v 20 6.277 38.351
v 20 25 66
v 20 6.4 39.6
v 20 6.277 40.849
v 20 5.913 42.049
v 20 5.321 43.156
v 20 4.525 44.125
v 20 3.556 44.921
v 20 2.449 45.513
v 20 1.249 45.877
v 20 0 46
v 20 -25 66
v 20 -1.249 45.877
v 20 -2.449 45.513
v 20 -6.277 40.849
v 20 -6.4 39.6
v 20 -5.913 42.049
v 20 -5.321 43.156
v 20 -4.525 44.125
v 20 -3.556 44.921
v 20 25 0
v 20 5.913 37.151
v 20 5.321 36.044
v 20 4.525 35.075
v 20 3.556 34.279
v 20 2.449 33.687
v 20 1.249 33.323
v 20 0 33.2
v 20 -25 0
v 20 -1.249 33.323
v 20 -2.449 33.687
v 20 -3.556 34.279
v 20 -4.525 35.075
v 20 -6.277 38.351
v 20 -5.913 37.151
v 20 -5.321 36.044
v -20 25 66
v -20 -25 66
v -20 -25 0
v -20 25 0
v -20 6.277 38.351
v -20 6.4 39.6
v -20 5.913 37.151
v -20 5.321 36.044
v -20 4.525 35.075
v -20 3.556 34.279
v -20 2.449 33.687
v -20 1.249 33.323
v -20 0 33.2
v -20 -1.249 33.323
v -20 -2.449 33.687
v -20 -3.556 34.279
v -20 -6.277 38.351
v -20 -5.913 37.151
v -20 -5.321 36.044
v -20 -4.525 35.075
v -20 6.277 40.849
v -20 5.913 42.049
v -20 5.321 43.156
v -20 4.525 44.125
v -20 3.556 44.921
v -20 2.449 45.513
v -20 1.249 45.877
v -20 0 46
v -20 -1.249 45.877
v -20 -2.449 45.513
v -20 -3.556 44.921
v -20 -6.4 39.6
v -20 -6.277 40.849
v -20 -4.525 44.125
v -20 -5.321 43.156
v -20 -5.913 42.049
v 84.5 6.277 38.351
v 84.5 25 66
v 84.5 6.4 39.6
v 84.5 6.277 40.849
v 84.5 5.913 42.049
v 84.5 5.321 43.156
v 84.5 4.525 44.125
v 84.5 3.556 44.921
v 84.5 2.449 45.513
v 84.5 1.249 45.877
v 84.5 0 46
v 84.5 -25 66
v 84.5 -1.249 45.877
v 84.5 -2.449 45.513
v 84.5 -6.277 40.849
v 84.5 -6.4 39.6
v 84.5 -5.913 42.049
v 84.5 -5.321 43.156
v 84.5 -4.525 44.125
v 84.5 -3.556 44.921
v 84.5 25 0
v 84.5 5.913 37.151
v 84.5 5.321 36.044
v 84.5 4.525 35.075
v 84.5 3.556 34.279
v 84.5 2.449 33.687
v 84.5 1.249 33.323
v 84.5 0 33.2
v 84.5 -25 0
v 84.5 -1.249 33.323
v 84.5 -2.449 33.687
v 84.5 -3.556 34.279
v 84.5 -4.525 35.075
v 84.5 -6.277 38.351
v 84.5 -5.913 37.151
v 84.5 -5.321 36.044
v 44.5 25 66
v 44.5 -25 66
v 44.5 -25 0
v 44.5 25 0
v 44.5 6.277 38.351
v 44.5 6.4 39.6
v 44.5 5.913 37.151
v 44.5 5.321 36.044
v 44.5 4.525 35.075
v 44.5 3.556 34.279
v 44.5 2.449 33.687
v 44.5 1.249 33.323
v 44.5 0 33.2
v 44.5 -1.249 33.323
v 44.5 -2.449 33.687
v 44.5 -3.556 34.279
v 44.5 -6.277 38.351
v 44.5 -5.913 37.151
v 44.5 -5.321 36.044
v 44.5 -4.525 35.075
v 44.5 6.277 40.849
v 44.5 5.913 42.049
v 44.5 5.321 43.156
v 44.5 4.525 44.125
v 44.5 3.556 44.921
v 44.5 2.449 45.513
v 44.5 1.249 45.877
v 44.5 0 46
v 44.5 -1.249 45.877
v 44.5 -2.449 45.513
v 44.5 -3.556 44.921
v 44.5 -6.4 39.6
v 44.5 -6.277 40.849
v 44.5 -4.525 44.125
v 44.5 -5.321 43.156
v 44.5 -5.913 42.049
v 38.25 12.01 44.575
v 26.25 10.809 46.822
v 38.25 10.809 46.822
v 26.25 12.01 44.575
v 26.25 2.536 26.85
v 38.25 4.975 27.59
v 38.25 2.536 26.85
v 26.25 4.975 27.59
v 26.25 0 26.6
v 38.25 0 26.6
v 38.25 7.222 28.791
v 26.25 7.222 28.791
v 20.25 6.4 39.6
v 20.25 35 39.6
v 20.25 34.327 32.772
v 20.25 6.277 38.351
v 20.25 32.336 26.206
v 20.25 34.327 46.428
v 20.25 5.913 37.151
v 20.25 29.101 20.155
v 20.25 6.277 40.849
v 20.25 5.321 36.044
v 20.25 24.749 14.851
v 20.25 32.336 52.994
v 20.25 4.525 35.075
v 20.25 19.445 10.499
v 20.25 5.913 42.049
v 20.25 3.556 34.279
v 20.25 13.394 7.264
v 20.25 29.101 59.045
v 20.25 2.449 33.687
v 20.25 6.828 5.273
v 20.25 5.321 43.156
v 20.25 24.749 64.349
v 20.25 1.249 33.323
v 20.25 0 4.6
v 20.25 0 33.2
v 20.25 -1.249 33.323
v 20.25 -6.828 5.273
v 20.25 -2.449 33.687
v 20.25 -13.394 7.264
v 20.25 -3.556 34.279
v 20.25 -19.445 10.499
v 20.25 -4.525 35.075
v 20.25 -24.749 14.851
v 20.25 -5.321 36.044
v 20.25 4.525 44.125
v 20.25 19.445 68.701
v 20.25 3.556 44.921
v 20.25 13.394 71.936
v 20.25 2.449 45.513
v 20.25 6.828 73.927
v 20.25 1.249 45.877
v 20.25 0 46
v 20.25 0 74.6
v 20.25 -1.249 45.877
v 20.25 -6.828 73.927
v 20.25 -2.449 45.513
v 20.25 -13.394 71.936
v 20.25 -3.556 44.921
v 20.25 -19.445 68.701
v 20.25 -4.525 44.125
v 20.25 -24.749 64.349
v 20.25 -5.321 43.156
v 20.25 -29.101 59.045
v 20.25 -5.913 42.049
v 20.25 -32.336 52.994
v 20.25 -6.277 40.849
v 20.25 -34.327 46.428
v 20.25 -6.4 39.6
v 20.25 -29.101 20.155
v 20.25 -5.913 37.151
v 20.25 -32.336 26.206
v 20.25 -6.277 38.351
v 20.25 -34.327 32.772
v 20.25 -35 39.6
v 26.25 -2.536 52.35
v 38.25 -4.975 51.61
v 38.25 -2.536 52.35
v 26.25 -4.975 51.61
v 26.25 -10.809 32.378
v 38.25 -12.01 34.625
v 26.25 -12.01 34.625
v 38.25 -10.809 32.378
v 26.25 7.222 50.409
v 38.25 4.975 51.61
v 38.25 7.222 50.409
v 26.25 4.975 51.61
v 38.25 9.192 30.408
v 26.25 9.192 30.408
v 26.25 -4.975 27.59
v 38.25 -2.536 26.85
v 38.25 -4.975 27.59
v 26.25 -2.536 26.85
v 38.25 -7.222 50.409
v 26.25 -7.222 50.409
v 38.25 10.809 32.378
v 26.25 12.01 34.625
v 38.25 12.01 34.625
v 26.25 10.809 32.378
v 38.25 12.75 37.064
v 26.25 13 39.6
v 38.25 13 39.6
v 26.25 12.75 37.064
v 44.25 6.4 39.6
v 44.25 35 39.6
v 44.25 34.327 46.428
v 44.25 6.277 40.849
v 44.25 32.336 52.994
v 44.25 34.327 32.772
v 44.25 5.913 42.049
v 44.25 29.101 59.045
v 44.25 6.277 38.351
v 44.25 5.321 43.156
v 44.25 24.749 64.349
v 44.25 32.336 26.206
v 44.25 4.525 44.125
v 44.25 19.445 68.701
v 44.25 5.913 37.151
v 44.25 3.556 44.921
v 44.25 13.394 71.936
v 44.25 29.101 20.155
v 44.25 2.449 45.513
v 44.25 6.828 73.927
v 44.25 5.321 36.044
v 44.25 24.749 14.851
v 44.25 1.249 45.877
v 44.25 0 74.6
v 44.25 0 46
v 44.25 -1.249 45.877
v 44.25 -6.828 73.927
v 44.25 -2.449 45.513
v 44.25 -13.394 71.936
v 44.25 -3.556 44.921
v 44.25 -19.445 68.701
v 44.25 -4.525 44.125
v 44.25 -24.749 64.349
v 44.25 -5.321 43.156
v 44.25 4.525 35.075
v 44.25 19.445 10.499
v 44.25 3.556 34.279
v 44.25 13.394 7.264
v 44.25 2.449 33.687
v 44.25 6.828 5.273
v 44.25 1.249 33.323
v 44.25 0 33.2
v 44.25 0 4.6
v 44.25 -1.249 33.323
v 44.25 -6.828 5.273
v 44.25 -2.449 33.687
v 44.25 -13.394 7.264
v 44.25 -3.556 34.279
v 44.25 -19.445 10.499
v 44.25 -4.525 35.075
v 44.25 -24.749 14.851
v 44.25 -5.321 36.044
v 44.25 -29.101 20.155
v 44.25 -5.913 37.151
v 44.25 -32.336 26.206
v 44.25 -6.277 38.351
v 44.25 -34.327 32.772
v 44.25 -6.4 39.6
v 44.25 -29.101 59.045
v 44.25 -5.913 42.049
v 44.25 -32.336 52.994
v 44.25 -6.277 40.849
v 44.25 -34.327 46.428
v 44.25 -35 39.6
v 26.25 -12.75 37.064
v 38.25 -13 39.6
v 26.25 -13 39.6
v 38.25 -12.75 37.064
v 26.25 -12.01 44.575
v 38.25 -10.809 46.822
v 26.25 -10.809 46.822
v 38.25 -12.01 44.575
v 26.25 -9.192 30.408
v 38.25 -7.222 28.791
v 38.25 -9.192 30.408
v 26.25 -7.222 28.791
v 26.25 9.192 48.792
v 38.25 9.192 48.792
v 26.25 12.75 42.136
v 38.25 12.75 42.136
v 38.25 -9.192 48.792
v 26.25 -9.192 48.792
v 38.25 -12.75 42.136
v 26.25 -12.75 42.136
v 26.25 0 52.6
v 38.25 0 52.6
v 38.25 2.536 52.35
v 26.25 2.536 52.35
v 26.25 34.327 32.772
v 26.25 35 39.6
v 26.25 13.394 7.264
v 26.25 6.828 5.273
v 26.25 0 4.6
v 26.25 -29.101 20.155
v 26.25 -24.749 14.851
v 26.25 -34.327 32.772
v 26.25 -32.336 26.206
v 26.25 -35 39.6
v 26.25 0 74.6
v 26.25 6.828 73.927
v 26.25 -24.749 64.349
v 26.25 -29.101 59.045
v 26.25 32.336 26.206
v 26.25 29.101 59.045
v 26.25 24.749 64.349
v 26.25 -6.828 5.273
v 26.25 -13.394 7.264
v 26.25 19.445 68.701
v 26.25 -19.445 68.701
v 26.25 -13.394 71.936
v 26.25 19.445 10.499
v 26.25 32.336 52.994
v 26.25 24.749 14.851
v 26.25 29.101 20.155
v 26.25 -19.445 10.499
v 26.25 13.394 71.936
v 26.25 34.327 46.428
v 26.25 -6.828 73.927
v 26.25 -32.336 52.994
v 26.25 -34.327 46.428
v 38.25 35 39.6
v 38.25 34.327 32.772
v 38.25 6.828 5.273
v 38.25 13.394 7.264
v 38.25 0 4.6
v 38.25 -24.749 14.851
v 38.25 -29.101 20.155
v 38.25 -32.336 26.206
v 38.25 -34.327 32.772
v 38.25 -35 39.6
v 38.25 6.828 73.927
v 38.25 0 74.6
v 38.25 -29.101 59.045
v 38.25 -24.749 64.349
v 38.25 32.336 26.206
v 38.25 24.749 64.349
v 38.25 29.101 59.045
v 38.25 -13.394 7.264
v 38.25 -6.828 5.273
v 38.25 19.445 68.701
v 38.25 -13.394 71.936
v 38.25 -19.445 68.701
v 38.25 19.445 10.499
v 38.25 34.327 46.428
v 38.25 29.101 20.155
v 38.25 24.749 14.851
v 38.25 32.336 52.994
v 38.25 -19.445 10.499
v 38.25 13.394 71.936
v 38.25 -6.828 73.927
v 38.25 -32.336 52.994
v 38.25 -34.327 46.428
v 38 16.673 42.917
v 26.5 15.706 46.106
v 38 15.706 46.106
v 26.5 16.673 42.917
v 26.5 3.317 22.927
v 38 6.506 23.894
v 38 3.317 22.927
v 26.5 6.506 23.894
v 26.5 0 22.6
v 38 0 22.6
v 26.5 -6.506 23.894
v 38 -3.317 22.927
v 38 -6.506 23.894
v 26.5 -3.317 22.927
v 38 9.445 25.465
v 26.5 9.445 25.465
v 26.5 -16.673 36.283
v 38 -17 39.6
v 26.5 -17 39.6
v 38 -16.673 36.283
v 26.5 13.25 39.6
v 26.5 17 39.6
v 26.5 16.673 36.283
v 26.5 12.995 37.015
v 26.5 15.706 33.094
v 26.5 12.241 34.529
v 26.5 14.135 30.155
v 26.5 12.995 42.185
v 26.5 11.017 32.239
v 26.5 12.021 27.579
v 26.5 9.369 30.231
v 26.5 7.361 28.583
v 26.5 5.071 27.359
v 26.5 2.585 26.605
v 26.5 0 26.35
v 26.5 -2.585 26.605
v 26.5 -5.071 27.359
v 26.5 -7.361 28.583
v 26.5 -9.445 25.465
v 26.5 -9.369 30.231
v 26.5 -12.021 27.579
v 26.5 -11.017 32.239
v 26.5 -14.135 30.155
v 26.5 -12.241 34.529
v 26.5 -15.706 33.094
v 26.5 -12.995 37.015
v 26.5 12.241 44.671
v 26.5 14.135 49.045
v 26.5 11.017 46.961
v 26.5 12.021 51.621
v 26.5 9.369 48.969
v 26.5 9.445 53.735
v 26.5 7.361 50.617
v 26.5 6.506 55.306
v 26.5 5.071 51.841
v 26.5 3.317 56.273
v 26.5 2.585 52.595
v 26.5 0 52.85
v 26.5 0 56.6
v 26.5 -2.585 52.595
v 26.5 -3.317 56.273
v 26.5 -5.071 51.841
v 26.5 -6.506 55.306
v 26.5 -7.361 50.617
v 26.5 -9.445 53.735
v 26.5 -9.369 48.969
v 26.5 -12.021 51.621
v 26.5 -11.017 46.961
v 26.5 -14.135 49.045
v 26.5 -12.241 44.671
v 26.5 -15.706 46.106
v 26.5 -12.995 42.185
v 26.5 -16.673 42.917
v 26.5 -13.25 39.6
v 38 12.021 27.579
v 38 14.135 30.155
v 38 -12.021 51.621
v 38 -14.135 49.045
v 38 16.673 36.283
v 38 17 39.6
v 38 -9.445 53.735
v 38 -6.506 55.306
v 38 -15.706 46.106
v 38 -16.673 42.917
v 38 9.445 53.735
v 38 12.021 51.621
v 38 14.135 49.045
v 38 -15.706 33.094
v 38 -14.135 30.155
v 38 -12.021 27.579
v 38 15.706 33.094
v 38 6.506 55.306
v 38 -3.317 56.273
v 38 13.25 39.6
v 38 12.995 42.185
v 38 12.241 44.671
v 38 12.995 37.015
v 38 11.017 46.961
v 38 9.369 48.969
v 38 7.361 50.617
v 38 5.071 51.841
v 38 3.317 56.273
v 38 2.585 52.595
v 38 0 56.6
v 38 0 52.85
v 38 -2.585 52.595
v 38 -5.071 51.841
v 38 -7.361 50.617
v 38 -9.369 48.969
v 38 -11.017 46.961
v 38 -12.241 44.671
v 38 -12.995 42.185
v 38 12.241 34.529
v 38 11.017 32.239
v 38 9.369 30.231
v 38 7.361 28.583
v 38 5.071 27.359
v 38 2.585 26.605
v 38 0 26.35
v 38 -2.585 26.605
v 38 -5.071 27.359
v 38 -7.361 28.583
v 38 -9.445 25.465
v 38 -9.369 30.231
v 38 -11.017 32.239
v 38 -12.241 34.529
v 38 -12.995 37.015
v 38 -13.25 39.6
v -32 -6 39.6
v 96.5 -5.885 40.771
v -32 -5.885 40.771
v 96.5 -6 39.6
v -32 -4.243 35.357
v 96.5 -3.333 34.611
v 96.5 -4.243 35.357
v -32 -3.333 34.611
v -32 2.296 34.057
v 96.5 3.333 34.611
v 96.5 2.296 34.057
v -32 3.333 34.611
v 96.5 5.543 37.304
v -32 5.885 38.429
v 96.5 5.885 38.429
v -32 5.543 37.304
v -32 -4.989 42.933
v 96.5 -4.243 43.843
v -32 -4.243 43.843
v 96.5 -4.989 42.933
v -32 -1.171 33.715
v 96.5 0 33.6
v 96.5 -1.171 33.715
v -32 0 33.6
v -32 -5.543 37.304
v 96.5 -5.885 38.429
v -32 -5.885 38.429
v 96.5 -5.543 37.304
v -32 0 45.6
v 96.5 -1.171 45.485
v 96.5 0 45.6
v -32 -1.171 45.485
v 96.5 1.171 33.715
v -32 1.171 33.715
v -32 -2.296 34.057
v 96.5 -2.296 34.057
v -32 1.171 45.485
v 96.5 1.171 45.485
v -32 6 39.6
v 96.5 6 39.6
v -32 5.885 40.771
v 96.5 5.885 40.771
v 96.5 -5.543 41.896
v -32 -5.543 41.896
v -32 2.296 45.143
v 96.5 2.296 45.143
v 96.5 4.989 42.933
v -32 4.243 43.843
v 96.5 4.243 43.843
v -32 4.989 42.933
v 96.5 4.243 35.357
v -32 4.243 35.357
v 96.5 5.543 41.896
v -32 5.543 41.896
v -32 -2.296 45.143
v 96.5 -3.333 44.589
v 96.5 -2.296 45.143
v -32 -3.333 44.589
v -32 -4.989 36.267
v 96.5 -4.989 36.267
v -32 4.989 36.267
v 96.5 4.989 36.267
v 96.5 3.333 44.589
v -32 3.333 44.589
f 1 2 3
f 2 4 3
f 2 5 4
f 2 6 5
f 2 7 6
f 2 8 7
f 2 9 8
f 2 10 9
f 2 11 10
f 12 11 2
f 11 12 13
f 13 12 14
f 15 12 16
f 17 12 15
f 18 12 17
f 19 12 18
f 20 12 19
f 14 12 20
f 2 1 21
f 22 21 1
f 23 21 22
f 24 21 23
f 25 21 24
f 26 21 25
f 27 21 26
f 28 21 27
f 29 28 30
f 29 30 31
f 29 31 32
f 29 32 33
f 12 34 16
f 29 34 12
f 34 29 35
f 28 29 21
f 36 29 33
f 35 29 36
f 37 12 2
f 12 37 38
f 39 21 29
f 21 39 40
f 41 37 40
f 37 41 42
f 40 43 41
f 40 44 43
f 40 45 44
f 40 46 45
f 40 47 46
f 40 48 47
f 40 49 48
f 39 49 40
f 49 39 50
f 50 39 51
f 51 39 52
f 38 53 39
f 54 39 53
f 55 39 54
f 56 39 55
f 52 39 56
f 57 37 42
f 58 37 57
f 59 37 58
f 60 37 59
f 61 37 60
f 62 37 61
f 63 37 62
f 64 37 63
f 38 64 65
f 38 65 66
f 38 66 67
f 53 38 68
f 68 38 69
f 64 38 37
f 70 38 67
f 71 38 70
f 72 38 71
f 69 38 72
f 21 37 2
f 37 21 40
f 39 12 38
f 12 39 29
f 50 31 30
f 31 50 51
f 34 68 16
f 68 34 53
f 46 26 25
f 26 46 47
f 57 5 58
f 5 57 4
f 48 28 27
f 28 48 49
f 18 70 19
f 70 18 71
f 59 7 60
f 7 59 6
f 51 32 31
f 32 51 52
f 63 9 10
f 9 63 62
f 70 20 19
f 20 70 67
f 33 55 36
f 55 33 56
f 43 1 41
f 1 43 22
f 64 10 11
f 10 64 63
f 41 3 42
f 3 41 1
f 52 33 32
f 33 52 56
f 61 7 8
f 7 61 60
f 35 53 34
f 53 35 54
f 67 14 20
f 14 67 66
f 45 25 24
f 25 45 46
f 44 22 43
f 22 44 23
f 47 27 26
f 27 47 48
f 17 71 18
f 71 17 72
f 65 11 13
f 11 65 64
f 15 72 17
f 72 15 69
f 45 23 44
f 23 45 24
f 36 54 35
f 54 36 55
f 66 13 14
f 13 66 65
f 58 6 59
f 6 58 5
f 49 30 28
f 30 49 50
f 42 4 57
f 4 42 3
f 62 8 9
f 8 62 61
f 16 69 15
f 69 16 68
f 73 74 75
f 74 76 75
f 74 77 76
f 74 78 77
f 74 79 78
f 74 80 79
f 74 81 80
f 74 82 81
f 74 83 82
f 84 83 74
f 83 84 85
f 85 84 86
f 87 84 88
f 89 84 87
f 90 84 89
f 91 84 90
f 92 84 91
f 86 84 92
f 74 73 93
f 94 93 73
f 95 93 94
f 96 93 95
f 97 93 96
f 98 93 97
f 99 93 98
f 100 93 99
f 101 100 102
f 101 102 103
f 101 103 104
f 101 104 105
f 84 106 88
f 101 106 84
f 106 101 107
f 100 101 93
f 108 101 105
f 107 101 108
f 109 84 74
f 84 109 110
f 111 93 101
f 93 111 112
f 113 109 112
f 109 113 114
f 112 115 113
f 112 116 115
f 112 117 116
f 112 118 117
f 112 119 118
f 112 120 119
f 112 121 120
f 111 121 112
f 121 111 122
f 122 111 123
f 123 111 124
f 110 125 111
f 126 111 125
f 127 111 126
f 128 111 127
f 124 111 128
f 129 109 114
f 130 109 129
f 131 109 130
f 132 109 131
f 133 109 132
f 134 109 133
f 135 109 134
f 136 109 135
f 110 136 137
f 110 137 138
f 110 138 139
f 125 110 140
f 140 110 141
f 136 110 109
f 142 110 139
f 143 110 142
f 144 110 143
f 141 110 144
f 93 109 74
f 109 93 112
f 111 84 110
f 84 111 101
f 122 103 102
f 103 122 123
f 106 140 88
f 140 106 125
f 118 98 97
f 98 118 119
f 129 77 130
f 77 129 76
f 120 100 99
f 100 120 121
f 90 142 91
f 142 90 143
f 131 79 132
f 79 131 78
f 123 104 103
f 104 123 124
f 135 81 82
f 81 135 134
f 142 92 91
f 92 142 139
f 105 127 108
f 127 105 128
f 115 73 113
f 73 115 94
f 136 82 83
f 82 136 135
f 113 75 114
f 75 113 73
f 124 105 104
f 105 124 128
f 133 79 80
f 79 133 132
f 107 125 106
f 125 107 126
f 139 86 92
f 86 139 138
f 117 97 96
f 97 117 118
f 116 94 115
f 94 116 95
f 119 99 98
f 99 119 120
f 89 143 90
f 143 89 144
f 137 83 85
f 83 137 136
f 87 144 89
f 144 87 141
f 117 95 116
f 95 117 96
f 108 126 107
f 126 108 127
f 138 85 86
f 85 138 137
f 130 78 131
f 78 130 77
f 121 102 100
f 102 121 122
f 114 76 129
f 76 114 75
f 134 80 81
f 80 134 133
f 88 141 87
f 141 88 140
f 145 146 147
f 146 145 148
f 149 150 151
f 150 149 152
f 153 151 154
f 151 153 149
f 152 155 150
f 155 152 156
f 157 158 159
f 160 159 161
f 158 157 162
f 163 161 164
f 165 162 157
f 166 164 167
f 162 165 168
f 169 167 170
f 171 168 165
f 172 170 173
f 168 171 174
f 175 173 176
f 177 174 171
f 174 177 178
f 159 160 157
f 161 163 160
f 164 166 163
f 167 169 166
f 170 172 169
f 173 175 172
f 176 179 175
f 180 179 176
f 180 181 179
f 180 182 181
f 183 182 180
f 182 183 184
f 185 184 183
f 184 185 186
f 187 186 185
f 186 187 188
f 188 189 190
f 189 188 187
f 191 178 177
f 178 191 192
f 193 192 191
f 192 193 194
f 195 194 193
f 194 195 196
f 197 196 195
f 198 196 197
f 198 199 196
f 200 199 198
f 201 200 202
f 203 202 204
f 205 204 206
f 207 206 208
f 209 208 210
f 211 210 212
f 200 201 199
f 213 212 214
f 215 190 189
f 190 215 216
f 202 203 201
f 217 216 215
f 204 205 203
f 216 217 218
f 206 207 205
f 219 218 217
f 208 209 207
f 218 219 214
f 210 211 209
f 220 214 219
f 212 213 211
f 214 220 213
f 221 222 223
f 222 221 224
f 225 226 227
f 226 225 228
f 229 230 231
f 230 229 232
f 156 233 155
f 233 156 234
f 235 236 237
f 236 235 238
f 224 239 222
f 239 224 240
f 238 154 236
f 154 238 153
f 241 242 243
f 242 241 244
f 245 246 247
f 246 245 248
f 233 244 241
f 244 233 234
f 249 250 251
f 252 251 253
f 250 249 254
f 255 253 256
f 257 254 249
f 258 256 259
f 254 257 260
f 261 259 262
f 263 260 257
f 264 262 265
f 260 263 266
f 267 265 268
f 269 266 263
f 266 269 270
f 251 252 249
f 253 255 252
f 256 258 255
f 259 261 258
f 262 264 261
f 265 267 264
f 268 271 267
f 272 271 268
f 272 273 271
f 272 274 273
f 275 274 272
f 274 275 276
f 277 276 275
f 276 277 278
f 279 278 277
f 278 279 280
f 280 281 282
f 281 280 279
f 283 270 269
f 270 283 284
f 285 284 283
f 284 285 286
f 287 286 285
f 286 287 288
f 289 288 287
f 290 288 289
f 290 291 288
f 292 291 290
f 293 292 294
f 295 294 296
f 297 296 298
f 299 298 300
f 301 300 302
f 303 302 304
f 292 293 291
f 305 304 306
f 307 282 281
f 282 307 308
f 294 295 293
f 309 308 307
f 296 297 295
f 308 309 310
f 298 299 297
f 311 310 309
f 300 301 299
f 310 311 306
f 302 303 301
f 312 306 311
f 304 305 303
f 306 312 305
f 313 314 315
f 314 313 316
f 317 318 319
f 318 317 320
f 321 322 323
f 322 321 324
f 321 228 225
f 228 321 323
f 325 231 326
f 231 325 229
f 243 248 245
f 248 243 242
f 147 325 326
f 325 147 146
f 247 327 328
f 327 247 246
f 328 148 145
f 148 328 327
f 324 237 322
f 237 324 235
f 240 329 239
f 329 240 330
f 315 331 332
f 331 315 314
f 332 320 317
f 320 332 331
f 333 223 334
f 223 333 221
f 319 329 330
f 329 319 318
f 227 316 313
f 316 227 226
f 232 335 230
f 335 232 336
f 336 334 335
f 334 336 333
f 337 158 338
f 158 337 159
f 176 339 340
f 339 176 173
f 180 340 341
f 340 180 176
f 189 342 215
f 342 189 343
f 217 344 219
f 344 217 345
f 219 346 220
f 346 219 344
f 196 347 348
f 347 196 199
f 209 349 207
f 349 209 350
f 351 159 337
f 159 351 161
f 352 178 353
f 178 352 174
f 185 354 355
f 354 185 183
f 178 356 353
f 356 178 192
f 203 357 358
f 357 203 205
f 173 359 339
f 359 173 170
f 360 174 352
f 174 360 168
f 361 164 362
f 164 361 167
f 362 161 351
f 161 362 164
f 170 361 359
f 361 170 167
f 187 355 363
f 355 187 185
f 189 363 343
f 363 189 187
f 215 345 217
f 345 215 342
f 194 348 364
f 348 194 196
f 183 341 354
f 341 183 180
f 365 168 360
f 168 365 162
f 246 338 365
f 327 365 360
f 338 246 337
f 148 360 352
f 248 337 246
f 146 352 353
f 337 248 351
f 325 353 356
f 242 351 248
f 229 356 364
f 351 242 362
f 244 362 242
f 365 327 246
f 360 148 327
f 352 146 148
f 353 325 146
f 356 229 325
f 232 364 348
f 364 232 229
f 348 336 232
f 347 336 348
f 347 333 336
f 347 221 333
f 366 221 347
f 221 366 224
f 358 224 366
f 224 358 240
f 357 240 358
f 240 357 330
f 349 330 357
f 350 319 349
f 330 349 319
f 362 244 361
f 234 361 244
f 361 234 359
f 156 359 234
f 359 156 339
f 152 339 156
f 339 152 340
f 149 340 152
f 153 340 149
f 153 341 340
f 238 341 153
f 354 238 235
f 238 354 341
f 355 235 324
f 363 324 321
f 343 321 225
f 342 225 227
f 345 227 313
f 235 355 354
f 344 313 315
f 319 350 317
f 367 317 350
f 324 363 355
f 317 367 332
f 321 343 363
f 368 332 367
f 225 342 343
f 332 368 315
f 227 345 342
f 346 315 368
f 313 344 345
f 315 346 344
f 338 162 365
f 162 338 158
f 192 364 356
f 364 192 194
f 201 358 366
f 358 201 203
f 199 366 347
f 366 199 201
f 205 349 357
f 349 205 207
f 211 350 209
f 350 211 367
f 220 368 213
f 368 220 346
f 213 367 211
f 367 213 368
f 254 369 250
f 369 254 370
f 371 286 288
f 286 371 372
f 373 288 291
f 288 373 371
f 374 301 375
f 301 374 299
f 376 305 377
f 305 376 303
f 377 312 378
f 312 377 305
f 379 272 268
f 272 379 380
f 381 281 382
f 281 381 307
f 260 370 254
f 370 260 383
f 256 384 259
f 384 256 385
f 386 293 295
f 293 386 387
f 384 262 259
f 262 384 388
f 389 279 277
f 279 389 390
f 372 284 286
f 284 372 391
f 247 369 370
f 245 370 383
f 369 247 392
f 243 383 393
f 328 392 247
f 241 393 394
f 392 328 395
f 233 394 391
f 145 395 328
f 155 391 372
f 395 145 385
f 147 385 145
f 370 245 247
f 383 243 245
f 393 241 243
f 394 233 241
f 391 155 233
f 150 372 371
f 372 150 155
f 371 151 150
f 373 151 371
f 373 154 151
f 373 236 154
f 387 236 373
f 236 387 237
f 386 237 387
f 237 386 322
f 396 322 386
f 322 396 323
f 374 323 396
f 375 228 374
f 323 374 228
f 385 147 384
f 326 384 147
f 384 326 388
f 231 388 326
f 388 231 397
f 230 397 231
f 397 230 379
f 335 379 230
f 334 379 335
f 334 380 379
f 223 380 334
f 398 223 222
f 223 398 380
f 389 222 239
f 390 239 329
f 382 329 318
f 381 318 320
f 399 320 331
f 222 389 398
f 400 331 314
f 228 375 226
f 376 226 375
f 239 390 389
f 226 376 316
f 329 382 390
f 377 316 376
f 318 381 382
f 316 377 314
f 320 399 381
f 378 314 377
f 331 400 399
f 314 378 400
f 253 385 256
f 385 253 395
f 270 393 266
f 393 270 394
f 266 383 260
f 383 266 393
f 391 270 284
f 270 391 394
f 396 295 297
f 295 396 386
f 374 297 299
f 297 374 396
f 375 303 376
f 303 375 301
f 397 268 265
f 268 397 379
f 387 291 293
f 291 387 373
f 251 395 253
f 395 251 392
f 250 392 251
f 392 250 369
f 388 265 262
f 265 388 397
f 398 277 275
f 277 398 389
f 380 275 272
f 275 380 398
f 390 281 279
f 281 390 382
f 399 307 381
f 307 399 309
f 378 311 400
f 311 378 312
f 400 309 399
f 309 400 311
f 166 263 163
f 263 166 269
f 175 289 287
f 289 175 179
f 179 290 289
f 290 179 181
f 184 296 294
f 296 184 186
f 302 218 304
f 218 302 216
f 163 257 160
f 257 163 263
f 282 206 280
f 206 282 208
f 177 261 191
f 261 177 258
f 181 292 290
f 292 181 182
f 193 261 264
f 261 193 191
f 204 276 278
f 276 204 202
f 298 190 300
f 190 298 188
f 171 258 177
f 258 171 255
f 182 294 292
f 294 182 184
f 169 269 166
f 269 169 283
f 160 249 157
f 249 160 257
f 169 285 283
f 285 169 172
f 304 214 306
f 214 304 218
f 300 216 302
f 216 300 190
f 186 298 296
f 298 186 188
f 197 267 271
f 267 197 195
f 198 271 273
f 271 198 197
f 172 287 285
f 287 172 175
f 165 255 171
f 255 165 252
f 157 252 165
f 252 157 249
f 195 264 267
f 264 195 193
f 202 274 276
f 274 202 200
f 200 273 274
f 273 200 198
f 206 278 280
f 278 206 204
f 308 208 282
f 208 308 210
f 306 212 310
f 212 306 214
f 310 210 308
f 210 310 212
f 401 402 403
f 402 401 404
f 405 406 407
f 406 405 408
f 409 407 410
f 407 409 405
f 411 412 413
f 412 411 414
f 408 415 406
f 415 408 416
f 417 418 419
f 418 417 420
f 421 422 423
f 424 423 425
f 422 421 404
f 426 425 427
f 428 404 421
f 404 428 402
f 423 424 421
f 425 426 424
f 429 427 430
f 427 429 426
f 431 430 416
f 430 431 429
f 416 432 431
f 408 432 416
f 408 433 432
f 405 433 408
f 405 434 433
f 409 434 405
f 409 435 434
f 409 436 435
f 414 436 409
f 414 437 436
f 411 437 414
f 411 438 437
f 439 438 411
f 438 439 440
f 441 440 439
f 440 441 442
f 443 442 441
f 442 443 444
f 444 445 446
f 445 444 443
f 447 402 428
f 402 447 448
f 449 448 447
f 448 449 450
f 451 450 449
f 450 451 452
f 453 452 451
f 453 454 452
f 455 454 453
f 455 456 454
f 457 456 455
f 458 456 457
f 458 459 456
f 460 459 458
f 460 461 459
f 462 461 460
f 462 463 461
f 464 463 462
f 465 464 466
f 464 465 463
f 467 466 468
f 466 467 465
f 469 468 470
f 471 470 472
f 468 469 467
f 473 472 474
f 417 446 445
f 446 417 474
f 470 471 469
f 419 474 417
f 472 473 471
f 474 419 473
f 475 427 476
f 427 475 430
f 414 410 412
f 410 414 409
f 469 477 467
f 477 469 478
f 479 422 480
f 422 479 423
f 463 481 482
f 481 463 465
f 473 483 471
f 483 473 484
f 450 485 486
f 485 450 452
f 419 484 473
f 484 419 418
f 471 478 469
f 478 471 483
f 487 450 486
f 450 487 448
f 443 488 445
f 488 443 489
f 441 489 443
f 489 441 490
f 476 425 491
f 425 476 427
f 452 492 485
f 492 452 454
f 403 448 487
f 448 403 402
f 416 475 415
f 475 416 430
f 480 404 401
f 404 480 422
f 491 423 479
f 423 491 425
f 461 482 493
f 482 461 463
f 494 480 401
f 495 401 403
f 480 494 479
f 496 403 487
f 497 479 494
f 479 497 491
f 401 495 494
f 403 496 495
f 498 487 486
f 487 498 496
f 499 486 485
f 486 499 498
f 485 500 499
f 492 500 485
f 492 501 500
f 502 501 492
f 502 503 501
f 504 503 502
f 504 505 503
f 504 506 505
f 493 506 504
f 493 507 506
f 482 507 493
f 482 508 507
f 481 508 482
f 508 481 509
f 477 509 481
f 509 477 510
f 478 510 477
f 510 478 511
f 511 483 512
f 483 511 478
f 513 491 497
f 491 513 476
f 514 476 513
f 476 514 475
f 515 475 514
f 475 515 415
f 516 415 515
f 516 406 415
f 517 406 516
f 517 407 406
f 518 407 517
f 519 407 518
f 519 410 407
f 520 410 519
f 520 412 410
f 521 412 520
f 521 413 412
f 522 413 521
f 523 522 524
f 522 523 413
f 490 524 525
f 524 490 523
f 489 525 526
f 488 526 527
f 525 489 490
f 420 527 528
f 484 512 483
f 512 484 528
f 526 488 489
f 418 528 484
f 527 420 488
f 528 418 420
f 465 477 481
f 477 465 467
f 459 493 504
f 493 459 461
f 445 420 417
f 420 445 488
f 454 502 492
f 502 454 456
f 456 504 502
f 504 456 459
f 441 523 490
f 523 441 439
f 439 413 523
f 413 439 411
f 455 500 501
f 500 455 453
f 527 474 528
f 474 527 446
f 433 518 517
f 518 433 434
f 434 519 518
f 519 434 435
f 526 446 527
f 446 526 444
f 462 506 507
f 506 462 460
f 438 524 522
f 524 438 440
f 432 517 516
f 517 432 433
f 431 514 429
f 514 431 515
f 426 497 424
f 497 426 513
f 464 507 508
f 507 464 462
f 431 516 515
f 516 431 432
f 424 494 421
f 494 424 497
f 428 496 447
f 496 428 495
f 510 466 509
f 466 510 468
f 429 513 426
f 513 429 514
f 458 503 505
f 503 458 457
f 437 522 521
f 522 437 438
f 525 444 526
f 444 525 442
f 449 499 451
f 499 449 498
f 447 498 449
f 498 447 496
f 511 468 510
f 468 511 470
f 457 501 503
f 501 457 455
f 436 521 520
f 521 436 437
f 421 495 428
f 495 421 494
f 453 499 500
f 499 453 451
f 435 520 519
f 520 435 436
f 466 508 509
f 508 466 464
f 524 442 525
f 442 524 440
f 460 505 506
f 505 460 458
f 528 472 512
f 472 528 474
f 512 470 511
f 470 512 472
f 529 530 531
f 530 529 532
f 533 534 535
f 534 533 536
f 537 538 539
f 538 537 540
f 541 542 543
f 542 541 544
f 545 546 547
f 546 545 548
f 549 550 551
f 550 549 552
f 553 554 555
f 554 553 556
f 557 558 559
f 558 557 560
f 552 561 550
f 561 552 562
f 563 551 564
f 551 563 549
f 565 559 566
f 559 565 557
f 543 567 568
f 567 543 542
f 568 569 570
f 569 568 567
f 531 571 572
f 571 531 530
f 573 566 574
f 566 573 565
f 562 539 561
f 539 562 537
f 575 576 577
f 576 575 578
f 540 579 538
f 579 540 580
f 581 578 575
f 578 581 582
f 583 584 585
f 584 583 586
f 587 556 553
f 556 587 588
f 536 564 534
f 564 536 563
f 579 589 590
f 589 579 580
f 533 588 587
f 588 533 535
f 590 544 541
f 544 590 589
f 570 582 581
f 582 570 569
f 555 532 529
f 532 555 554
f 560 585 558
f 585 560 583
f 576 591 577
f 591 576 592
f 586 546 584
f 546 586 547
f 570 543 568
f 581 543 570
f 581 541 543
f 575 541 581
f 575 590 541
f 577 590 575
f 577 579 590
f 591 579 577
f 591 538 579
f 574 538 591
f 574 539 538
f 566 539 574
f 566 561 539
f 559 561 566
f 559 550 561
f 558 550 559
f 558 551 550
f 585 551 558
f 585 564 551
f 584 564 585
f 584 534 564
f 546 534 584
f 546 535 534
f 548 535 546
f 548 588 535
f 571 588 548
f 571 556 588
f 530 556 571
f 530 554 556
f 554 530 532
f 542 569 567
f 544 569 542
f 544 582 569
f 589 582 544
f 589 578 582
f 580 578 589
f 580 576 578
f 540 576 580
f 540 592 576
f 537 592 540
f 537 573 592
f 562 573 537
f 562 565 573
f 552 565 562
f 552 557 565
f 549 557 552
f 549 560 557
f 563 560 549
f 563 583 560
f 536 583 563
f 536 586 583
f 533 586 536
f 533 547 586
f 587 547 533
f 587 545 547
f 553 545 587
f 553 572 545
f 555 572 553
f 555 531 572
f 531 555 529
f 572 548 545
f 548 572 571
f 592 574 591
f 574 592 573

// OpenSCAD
$fn = 32;

// ------------------------------------------------------------------------
// Pulley assembly: d70 pulley with a belt, shaft d12
// Every part is its own module, assembly() places them once.
// ------------------------------------------------------------------------

// --- part 1 ---
module support1() {
  difference() {
    translate([-20, -25, 0]) cube([40, 50, 66]);
    translate([0, 0, 39.6]) rotate([0, 90, 0]) cylinder(h = 42, d = 12.8, center = true);
  }
}

// --- part 2 ---
module support2() {
  difference() {
    translate([-20, -25, 0]) cube([40, 50, 66]);
    translate([0, 0, 39.6]) rotate([0, 90, 0]) cylinder(h = 42, d = 12.8, center = true);
  }
}

// --- part 3 ---
module shaft() {
  translate([0, 0, -64.25]) cylinder(h = 128.5, d = 12);
}

// --- part 4 ---
module pulley() {
  difference() {
    union() {
      cylinder(h = 24, d = 26);
      cylinder(h = 6, d = 70);
      translate([0, 0, 18]) cylinder(h = 6, d = 70);
    }
    translate([0, 0, -1]) cylinder(h = 26, d = 12.8);
  }
}

// --- part 5 ---
module belt() {
  difference() {
      translate([0, 0, 0]) cylinder(h = 11.5, d = 34);
      translate([0, 0, -1]) cylinder(h = 13.5, d = 26.5);
    }
}

// --- assembly ---
module assembly() {
  translate([0, 0, 0]) rotate([0, 0, 0]) support1();
  translate([64.5, 0, 0]) rotate([0, 0, 0]) support2();
  translate([32.25, 0, 39.6]) rotate([0, 90, 0]) shaft();
  translate([20.25, 0, 39.6]) rotate([0, 90, 0]) pulley();
  translate([26.5, 0, 39.6]) rotate([0, 90, 0]) belt();
}

assembly();
